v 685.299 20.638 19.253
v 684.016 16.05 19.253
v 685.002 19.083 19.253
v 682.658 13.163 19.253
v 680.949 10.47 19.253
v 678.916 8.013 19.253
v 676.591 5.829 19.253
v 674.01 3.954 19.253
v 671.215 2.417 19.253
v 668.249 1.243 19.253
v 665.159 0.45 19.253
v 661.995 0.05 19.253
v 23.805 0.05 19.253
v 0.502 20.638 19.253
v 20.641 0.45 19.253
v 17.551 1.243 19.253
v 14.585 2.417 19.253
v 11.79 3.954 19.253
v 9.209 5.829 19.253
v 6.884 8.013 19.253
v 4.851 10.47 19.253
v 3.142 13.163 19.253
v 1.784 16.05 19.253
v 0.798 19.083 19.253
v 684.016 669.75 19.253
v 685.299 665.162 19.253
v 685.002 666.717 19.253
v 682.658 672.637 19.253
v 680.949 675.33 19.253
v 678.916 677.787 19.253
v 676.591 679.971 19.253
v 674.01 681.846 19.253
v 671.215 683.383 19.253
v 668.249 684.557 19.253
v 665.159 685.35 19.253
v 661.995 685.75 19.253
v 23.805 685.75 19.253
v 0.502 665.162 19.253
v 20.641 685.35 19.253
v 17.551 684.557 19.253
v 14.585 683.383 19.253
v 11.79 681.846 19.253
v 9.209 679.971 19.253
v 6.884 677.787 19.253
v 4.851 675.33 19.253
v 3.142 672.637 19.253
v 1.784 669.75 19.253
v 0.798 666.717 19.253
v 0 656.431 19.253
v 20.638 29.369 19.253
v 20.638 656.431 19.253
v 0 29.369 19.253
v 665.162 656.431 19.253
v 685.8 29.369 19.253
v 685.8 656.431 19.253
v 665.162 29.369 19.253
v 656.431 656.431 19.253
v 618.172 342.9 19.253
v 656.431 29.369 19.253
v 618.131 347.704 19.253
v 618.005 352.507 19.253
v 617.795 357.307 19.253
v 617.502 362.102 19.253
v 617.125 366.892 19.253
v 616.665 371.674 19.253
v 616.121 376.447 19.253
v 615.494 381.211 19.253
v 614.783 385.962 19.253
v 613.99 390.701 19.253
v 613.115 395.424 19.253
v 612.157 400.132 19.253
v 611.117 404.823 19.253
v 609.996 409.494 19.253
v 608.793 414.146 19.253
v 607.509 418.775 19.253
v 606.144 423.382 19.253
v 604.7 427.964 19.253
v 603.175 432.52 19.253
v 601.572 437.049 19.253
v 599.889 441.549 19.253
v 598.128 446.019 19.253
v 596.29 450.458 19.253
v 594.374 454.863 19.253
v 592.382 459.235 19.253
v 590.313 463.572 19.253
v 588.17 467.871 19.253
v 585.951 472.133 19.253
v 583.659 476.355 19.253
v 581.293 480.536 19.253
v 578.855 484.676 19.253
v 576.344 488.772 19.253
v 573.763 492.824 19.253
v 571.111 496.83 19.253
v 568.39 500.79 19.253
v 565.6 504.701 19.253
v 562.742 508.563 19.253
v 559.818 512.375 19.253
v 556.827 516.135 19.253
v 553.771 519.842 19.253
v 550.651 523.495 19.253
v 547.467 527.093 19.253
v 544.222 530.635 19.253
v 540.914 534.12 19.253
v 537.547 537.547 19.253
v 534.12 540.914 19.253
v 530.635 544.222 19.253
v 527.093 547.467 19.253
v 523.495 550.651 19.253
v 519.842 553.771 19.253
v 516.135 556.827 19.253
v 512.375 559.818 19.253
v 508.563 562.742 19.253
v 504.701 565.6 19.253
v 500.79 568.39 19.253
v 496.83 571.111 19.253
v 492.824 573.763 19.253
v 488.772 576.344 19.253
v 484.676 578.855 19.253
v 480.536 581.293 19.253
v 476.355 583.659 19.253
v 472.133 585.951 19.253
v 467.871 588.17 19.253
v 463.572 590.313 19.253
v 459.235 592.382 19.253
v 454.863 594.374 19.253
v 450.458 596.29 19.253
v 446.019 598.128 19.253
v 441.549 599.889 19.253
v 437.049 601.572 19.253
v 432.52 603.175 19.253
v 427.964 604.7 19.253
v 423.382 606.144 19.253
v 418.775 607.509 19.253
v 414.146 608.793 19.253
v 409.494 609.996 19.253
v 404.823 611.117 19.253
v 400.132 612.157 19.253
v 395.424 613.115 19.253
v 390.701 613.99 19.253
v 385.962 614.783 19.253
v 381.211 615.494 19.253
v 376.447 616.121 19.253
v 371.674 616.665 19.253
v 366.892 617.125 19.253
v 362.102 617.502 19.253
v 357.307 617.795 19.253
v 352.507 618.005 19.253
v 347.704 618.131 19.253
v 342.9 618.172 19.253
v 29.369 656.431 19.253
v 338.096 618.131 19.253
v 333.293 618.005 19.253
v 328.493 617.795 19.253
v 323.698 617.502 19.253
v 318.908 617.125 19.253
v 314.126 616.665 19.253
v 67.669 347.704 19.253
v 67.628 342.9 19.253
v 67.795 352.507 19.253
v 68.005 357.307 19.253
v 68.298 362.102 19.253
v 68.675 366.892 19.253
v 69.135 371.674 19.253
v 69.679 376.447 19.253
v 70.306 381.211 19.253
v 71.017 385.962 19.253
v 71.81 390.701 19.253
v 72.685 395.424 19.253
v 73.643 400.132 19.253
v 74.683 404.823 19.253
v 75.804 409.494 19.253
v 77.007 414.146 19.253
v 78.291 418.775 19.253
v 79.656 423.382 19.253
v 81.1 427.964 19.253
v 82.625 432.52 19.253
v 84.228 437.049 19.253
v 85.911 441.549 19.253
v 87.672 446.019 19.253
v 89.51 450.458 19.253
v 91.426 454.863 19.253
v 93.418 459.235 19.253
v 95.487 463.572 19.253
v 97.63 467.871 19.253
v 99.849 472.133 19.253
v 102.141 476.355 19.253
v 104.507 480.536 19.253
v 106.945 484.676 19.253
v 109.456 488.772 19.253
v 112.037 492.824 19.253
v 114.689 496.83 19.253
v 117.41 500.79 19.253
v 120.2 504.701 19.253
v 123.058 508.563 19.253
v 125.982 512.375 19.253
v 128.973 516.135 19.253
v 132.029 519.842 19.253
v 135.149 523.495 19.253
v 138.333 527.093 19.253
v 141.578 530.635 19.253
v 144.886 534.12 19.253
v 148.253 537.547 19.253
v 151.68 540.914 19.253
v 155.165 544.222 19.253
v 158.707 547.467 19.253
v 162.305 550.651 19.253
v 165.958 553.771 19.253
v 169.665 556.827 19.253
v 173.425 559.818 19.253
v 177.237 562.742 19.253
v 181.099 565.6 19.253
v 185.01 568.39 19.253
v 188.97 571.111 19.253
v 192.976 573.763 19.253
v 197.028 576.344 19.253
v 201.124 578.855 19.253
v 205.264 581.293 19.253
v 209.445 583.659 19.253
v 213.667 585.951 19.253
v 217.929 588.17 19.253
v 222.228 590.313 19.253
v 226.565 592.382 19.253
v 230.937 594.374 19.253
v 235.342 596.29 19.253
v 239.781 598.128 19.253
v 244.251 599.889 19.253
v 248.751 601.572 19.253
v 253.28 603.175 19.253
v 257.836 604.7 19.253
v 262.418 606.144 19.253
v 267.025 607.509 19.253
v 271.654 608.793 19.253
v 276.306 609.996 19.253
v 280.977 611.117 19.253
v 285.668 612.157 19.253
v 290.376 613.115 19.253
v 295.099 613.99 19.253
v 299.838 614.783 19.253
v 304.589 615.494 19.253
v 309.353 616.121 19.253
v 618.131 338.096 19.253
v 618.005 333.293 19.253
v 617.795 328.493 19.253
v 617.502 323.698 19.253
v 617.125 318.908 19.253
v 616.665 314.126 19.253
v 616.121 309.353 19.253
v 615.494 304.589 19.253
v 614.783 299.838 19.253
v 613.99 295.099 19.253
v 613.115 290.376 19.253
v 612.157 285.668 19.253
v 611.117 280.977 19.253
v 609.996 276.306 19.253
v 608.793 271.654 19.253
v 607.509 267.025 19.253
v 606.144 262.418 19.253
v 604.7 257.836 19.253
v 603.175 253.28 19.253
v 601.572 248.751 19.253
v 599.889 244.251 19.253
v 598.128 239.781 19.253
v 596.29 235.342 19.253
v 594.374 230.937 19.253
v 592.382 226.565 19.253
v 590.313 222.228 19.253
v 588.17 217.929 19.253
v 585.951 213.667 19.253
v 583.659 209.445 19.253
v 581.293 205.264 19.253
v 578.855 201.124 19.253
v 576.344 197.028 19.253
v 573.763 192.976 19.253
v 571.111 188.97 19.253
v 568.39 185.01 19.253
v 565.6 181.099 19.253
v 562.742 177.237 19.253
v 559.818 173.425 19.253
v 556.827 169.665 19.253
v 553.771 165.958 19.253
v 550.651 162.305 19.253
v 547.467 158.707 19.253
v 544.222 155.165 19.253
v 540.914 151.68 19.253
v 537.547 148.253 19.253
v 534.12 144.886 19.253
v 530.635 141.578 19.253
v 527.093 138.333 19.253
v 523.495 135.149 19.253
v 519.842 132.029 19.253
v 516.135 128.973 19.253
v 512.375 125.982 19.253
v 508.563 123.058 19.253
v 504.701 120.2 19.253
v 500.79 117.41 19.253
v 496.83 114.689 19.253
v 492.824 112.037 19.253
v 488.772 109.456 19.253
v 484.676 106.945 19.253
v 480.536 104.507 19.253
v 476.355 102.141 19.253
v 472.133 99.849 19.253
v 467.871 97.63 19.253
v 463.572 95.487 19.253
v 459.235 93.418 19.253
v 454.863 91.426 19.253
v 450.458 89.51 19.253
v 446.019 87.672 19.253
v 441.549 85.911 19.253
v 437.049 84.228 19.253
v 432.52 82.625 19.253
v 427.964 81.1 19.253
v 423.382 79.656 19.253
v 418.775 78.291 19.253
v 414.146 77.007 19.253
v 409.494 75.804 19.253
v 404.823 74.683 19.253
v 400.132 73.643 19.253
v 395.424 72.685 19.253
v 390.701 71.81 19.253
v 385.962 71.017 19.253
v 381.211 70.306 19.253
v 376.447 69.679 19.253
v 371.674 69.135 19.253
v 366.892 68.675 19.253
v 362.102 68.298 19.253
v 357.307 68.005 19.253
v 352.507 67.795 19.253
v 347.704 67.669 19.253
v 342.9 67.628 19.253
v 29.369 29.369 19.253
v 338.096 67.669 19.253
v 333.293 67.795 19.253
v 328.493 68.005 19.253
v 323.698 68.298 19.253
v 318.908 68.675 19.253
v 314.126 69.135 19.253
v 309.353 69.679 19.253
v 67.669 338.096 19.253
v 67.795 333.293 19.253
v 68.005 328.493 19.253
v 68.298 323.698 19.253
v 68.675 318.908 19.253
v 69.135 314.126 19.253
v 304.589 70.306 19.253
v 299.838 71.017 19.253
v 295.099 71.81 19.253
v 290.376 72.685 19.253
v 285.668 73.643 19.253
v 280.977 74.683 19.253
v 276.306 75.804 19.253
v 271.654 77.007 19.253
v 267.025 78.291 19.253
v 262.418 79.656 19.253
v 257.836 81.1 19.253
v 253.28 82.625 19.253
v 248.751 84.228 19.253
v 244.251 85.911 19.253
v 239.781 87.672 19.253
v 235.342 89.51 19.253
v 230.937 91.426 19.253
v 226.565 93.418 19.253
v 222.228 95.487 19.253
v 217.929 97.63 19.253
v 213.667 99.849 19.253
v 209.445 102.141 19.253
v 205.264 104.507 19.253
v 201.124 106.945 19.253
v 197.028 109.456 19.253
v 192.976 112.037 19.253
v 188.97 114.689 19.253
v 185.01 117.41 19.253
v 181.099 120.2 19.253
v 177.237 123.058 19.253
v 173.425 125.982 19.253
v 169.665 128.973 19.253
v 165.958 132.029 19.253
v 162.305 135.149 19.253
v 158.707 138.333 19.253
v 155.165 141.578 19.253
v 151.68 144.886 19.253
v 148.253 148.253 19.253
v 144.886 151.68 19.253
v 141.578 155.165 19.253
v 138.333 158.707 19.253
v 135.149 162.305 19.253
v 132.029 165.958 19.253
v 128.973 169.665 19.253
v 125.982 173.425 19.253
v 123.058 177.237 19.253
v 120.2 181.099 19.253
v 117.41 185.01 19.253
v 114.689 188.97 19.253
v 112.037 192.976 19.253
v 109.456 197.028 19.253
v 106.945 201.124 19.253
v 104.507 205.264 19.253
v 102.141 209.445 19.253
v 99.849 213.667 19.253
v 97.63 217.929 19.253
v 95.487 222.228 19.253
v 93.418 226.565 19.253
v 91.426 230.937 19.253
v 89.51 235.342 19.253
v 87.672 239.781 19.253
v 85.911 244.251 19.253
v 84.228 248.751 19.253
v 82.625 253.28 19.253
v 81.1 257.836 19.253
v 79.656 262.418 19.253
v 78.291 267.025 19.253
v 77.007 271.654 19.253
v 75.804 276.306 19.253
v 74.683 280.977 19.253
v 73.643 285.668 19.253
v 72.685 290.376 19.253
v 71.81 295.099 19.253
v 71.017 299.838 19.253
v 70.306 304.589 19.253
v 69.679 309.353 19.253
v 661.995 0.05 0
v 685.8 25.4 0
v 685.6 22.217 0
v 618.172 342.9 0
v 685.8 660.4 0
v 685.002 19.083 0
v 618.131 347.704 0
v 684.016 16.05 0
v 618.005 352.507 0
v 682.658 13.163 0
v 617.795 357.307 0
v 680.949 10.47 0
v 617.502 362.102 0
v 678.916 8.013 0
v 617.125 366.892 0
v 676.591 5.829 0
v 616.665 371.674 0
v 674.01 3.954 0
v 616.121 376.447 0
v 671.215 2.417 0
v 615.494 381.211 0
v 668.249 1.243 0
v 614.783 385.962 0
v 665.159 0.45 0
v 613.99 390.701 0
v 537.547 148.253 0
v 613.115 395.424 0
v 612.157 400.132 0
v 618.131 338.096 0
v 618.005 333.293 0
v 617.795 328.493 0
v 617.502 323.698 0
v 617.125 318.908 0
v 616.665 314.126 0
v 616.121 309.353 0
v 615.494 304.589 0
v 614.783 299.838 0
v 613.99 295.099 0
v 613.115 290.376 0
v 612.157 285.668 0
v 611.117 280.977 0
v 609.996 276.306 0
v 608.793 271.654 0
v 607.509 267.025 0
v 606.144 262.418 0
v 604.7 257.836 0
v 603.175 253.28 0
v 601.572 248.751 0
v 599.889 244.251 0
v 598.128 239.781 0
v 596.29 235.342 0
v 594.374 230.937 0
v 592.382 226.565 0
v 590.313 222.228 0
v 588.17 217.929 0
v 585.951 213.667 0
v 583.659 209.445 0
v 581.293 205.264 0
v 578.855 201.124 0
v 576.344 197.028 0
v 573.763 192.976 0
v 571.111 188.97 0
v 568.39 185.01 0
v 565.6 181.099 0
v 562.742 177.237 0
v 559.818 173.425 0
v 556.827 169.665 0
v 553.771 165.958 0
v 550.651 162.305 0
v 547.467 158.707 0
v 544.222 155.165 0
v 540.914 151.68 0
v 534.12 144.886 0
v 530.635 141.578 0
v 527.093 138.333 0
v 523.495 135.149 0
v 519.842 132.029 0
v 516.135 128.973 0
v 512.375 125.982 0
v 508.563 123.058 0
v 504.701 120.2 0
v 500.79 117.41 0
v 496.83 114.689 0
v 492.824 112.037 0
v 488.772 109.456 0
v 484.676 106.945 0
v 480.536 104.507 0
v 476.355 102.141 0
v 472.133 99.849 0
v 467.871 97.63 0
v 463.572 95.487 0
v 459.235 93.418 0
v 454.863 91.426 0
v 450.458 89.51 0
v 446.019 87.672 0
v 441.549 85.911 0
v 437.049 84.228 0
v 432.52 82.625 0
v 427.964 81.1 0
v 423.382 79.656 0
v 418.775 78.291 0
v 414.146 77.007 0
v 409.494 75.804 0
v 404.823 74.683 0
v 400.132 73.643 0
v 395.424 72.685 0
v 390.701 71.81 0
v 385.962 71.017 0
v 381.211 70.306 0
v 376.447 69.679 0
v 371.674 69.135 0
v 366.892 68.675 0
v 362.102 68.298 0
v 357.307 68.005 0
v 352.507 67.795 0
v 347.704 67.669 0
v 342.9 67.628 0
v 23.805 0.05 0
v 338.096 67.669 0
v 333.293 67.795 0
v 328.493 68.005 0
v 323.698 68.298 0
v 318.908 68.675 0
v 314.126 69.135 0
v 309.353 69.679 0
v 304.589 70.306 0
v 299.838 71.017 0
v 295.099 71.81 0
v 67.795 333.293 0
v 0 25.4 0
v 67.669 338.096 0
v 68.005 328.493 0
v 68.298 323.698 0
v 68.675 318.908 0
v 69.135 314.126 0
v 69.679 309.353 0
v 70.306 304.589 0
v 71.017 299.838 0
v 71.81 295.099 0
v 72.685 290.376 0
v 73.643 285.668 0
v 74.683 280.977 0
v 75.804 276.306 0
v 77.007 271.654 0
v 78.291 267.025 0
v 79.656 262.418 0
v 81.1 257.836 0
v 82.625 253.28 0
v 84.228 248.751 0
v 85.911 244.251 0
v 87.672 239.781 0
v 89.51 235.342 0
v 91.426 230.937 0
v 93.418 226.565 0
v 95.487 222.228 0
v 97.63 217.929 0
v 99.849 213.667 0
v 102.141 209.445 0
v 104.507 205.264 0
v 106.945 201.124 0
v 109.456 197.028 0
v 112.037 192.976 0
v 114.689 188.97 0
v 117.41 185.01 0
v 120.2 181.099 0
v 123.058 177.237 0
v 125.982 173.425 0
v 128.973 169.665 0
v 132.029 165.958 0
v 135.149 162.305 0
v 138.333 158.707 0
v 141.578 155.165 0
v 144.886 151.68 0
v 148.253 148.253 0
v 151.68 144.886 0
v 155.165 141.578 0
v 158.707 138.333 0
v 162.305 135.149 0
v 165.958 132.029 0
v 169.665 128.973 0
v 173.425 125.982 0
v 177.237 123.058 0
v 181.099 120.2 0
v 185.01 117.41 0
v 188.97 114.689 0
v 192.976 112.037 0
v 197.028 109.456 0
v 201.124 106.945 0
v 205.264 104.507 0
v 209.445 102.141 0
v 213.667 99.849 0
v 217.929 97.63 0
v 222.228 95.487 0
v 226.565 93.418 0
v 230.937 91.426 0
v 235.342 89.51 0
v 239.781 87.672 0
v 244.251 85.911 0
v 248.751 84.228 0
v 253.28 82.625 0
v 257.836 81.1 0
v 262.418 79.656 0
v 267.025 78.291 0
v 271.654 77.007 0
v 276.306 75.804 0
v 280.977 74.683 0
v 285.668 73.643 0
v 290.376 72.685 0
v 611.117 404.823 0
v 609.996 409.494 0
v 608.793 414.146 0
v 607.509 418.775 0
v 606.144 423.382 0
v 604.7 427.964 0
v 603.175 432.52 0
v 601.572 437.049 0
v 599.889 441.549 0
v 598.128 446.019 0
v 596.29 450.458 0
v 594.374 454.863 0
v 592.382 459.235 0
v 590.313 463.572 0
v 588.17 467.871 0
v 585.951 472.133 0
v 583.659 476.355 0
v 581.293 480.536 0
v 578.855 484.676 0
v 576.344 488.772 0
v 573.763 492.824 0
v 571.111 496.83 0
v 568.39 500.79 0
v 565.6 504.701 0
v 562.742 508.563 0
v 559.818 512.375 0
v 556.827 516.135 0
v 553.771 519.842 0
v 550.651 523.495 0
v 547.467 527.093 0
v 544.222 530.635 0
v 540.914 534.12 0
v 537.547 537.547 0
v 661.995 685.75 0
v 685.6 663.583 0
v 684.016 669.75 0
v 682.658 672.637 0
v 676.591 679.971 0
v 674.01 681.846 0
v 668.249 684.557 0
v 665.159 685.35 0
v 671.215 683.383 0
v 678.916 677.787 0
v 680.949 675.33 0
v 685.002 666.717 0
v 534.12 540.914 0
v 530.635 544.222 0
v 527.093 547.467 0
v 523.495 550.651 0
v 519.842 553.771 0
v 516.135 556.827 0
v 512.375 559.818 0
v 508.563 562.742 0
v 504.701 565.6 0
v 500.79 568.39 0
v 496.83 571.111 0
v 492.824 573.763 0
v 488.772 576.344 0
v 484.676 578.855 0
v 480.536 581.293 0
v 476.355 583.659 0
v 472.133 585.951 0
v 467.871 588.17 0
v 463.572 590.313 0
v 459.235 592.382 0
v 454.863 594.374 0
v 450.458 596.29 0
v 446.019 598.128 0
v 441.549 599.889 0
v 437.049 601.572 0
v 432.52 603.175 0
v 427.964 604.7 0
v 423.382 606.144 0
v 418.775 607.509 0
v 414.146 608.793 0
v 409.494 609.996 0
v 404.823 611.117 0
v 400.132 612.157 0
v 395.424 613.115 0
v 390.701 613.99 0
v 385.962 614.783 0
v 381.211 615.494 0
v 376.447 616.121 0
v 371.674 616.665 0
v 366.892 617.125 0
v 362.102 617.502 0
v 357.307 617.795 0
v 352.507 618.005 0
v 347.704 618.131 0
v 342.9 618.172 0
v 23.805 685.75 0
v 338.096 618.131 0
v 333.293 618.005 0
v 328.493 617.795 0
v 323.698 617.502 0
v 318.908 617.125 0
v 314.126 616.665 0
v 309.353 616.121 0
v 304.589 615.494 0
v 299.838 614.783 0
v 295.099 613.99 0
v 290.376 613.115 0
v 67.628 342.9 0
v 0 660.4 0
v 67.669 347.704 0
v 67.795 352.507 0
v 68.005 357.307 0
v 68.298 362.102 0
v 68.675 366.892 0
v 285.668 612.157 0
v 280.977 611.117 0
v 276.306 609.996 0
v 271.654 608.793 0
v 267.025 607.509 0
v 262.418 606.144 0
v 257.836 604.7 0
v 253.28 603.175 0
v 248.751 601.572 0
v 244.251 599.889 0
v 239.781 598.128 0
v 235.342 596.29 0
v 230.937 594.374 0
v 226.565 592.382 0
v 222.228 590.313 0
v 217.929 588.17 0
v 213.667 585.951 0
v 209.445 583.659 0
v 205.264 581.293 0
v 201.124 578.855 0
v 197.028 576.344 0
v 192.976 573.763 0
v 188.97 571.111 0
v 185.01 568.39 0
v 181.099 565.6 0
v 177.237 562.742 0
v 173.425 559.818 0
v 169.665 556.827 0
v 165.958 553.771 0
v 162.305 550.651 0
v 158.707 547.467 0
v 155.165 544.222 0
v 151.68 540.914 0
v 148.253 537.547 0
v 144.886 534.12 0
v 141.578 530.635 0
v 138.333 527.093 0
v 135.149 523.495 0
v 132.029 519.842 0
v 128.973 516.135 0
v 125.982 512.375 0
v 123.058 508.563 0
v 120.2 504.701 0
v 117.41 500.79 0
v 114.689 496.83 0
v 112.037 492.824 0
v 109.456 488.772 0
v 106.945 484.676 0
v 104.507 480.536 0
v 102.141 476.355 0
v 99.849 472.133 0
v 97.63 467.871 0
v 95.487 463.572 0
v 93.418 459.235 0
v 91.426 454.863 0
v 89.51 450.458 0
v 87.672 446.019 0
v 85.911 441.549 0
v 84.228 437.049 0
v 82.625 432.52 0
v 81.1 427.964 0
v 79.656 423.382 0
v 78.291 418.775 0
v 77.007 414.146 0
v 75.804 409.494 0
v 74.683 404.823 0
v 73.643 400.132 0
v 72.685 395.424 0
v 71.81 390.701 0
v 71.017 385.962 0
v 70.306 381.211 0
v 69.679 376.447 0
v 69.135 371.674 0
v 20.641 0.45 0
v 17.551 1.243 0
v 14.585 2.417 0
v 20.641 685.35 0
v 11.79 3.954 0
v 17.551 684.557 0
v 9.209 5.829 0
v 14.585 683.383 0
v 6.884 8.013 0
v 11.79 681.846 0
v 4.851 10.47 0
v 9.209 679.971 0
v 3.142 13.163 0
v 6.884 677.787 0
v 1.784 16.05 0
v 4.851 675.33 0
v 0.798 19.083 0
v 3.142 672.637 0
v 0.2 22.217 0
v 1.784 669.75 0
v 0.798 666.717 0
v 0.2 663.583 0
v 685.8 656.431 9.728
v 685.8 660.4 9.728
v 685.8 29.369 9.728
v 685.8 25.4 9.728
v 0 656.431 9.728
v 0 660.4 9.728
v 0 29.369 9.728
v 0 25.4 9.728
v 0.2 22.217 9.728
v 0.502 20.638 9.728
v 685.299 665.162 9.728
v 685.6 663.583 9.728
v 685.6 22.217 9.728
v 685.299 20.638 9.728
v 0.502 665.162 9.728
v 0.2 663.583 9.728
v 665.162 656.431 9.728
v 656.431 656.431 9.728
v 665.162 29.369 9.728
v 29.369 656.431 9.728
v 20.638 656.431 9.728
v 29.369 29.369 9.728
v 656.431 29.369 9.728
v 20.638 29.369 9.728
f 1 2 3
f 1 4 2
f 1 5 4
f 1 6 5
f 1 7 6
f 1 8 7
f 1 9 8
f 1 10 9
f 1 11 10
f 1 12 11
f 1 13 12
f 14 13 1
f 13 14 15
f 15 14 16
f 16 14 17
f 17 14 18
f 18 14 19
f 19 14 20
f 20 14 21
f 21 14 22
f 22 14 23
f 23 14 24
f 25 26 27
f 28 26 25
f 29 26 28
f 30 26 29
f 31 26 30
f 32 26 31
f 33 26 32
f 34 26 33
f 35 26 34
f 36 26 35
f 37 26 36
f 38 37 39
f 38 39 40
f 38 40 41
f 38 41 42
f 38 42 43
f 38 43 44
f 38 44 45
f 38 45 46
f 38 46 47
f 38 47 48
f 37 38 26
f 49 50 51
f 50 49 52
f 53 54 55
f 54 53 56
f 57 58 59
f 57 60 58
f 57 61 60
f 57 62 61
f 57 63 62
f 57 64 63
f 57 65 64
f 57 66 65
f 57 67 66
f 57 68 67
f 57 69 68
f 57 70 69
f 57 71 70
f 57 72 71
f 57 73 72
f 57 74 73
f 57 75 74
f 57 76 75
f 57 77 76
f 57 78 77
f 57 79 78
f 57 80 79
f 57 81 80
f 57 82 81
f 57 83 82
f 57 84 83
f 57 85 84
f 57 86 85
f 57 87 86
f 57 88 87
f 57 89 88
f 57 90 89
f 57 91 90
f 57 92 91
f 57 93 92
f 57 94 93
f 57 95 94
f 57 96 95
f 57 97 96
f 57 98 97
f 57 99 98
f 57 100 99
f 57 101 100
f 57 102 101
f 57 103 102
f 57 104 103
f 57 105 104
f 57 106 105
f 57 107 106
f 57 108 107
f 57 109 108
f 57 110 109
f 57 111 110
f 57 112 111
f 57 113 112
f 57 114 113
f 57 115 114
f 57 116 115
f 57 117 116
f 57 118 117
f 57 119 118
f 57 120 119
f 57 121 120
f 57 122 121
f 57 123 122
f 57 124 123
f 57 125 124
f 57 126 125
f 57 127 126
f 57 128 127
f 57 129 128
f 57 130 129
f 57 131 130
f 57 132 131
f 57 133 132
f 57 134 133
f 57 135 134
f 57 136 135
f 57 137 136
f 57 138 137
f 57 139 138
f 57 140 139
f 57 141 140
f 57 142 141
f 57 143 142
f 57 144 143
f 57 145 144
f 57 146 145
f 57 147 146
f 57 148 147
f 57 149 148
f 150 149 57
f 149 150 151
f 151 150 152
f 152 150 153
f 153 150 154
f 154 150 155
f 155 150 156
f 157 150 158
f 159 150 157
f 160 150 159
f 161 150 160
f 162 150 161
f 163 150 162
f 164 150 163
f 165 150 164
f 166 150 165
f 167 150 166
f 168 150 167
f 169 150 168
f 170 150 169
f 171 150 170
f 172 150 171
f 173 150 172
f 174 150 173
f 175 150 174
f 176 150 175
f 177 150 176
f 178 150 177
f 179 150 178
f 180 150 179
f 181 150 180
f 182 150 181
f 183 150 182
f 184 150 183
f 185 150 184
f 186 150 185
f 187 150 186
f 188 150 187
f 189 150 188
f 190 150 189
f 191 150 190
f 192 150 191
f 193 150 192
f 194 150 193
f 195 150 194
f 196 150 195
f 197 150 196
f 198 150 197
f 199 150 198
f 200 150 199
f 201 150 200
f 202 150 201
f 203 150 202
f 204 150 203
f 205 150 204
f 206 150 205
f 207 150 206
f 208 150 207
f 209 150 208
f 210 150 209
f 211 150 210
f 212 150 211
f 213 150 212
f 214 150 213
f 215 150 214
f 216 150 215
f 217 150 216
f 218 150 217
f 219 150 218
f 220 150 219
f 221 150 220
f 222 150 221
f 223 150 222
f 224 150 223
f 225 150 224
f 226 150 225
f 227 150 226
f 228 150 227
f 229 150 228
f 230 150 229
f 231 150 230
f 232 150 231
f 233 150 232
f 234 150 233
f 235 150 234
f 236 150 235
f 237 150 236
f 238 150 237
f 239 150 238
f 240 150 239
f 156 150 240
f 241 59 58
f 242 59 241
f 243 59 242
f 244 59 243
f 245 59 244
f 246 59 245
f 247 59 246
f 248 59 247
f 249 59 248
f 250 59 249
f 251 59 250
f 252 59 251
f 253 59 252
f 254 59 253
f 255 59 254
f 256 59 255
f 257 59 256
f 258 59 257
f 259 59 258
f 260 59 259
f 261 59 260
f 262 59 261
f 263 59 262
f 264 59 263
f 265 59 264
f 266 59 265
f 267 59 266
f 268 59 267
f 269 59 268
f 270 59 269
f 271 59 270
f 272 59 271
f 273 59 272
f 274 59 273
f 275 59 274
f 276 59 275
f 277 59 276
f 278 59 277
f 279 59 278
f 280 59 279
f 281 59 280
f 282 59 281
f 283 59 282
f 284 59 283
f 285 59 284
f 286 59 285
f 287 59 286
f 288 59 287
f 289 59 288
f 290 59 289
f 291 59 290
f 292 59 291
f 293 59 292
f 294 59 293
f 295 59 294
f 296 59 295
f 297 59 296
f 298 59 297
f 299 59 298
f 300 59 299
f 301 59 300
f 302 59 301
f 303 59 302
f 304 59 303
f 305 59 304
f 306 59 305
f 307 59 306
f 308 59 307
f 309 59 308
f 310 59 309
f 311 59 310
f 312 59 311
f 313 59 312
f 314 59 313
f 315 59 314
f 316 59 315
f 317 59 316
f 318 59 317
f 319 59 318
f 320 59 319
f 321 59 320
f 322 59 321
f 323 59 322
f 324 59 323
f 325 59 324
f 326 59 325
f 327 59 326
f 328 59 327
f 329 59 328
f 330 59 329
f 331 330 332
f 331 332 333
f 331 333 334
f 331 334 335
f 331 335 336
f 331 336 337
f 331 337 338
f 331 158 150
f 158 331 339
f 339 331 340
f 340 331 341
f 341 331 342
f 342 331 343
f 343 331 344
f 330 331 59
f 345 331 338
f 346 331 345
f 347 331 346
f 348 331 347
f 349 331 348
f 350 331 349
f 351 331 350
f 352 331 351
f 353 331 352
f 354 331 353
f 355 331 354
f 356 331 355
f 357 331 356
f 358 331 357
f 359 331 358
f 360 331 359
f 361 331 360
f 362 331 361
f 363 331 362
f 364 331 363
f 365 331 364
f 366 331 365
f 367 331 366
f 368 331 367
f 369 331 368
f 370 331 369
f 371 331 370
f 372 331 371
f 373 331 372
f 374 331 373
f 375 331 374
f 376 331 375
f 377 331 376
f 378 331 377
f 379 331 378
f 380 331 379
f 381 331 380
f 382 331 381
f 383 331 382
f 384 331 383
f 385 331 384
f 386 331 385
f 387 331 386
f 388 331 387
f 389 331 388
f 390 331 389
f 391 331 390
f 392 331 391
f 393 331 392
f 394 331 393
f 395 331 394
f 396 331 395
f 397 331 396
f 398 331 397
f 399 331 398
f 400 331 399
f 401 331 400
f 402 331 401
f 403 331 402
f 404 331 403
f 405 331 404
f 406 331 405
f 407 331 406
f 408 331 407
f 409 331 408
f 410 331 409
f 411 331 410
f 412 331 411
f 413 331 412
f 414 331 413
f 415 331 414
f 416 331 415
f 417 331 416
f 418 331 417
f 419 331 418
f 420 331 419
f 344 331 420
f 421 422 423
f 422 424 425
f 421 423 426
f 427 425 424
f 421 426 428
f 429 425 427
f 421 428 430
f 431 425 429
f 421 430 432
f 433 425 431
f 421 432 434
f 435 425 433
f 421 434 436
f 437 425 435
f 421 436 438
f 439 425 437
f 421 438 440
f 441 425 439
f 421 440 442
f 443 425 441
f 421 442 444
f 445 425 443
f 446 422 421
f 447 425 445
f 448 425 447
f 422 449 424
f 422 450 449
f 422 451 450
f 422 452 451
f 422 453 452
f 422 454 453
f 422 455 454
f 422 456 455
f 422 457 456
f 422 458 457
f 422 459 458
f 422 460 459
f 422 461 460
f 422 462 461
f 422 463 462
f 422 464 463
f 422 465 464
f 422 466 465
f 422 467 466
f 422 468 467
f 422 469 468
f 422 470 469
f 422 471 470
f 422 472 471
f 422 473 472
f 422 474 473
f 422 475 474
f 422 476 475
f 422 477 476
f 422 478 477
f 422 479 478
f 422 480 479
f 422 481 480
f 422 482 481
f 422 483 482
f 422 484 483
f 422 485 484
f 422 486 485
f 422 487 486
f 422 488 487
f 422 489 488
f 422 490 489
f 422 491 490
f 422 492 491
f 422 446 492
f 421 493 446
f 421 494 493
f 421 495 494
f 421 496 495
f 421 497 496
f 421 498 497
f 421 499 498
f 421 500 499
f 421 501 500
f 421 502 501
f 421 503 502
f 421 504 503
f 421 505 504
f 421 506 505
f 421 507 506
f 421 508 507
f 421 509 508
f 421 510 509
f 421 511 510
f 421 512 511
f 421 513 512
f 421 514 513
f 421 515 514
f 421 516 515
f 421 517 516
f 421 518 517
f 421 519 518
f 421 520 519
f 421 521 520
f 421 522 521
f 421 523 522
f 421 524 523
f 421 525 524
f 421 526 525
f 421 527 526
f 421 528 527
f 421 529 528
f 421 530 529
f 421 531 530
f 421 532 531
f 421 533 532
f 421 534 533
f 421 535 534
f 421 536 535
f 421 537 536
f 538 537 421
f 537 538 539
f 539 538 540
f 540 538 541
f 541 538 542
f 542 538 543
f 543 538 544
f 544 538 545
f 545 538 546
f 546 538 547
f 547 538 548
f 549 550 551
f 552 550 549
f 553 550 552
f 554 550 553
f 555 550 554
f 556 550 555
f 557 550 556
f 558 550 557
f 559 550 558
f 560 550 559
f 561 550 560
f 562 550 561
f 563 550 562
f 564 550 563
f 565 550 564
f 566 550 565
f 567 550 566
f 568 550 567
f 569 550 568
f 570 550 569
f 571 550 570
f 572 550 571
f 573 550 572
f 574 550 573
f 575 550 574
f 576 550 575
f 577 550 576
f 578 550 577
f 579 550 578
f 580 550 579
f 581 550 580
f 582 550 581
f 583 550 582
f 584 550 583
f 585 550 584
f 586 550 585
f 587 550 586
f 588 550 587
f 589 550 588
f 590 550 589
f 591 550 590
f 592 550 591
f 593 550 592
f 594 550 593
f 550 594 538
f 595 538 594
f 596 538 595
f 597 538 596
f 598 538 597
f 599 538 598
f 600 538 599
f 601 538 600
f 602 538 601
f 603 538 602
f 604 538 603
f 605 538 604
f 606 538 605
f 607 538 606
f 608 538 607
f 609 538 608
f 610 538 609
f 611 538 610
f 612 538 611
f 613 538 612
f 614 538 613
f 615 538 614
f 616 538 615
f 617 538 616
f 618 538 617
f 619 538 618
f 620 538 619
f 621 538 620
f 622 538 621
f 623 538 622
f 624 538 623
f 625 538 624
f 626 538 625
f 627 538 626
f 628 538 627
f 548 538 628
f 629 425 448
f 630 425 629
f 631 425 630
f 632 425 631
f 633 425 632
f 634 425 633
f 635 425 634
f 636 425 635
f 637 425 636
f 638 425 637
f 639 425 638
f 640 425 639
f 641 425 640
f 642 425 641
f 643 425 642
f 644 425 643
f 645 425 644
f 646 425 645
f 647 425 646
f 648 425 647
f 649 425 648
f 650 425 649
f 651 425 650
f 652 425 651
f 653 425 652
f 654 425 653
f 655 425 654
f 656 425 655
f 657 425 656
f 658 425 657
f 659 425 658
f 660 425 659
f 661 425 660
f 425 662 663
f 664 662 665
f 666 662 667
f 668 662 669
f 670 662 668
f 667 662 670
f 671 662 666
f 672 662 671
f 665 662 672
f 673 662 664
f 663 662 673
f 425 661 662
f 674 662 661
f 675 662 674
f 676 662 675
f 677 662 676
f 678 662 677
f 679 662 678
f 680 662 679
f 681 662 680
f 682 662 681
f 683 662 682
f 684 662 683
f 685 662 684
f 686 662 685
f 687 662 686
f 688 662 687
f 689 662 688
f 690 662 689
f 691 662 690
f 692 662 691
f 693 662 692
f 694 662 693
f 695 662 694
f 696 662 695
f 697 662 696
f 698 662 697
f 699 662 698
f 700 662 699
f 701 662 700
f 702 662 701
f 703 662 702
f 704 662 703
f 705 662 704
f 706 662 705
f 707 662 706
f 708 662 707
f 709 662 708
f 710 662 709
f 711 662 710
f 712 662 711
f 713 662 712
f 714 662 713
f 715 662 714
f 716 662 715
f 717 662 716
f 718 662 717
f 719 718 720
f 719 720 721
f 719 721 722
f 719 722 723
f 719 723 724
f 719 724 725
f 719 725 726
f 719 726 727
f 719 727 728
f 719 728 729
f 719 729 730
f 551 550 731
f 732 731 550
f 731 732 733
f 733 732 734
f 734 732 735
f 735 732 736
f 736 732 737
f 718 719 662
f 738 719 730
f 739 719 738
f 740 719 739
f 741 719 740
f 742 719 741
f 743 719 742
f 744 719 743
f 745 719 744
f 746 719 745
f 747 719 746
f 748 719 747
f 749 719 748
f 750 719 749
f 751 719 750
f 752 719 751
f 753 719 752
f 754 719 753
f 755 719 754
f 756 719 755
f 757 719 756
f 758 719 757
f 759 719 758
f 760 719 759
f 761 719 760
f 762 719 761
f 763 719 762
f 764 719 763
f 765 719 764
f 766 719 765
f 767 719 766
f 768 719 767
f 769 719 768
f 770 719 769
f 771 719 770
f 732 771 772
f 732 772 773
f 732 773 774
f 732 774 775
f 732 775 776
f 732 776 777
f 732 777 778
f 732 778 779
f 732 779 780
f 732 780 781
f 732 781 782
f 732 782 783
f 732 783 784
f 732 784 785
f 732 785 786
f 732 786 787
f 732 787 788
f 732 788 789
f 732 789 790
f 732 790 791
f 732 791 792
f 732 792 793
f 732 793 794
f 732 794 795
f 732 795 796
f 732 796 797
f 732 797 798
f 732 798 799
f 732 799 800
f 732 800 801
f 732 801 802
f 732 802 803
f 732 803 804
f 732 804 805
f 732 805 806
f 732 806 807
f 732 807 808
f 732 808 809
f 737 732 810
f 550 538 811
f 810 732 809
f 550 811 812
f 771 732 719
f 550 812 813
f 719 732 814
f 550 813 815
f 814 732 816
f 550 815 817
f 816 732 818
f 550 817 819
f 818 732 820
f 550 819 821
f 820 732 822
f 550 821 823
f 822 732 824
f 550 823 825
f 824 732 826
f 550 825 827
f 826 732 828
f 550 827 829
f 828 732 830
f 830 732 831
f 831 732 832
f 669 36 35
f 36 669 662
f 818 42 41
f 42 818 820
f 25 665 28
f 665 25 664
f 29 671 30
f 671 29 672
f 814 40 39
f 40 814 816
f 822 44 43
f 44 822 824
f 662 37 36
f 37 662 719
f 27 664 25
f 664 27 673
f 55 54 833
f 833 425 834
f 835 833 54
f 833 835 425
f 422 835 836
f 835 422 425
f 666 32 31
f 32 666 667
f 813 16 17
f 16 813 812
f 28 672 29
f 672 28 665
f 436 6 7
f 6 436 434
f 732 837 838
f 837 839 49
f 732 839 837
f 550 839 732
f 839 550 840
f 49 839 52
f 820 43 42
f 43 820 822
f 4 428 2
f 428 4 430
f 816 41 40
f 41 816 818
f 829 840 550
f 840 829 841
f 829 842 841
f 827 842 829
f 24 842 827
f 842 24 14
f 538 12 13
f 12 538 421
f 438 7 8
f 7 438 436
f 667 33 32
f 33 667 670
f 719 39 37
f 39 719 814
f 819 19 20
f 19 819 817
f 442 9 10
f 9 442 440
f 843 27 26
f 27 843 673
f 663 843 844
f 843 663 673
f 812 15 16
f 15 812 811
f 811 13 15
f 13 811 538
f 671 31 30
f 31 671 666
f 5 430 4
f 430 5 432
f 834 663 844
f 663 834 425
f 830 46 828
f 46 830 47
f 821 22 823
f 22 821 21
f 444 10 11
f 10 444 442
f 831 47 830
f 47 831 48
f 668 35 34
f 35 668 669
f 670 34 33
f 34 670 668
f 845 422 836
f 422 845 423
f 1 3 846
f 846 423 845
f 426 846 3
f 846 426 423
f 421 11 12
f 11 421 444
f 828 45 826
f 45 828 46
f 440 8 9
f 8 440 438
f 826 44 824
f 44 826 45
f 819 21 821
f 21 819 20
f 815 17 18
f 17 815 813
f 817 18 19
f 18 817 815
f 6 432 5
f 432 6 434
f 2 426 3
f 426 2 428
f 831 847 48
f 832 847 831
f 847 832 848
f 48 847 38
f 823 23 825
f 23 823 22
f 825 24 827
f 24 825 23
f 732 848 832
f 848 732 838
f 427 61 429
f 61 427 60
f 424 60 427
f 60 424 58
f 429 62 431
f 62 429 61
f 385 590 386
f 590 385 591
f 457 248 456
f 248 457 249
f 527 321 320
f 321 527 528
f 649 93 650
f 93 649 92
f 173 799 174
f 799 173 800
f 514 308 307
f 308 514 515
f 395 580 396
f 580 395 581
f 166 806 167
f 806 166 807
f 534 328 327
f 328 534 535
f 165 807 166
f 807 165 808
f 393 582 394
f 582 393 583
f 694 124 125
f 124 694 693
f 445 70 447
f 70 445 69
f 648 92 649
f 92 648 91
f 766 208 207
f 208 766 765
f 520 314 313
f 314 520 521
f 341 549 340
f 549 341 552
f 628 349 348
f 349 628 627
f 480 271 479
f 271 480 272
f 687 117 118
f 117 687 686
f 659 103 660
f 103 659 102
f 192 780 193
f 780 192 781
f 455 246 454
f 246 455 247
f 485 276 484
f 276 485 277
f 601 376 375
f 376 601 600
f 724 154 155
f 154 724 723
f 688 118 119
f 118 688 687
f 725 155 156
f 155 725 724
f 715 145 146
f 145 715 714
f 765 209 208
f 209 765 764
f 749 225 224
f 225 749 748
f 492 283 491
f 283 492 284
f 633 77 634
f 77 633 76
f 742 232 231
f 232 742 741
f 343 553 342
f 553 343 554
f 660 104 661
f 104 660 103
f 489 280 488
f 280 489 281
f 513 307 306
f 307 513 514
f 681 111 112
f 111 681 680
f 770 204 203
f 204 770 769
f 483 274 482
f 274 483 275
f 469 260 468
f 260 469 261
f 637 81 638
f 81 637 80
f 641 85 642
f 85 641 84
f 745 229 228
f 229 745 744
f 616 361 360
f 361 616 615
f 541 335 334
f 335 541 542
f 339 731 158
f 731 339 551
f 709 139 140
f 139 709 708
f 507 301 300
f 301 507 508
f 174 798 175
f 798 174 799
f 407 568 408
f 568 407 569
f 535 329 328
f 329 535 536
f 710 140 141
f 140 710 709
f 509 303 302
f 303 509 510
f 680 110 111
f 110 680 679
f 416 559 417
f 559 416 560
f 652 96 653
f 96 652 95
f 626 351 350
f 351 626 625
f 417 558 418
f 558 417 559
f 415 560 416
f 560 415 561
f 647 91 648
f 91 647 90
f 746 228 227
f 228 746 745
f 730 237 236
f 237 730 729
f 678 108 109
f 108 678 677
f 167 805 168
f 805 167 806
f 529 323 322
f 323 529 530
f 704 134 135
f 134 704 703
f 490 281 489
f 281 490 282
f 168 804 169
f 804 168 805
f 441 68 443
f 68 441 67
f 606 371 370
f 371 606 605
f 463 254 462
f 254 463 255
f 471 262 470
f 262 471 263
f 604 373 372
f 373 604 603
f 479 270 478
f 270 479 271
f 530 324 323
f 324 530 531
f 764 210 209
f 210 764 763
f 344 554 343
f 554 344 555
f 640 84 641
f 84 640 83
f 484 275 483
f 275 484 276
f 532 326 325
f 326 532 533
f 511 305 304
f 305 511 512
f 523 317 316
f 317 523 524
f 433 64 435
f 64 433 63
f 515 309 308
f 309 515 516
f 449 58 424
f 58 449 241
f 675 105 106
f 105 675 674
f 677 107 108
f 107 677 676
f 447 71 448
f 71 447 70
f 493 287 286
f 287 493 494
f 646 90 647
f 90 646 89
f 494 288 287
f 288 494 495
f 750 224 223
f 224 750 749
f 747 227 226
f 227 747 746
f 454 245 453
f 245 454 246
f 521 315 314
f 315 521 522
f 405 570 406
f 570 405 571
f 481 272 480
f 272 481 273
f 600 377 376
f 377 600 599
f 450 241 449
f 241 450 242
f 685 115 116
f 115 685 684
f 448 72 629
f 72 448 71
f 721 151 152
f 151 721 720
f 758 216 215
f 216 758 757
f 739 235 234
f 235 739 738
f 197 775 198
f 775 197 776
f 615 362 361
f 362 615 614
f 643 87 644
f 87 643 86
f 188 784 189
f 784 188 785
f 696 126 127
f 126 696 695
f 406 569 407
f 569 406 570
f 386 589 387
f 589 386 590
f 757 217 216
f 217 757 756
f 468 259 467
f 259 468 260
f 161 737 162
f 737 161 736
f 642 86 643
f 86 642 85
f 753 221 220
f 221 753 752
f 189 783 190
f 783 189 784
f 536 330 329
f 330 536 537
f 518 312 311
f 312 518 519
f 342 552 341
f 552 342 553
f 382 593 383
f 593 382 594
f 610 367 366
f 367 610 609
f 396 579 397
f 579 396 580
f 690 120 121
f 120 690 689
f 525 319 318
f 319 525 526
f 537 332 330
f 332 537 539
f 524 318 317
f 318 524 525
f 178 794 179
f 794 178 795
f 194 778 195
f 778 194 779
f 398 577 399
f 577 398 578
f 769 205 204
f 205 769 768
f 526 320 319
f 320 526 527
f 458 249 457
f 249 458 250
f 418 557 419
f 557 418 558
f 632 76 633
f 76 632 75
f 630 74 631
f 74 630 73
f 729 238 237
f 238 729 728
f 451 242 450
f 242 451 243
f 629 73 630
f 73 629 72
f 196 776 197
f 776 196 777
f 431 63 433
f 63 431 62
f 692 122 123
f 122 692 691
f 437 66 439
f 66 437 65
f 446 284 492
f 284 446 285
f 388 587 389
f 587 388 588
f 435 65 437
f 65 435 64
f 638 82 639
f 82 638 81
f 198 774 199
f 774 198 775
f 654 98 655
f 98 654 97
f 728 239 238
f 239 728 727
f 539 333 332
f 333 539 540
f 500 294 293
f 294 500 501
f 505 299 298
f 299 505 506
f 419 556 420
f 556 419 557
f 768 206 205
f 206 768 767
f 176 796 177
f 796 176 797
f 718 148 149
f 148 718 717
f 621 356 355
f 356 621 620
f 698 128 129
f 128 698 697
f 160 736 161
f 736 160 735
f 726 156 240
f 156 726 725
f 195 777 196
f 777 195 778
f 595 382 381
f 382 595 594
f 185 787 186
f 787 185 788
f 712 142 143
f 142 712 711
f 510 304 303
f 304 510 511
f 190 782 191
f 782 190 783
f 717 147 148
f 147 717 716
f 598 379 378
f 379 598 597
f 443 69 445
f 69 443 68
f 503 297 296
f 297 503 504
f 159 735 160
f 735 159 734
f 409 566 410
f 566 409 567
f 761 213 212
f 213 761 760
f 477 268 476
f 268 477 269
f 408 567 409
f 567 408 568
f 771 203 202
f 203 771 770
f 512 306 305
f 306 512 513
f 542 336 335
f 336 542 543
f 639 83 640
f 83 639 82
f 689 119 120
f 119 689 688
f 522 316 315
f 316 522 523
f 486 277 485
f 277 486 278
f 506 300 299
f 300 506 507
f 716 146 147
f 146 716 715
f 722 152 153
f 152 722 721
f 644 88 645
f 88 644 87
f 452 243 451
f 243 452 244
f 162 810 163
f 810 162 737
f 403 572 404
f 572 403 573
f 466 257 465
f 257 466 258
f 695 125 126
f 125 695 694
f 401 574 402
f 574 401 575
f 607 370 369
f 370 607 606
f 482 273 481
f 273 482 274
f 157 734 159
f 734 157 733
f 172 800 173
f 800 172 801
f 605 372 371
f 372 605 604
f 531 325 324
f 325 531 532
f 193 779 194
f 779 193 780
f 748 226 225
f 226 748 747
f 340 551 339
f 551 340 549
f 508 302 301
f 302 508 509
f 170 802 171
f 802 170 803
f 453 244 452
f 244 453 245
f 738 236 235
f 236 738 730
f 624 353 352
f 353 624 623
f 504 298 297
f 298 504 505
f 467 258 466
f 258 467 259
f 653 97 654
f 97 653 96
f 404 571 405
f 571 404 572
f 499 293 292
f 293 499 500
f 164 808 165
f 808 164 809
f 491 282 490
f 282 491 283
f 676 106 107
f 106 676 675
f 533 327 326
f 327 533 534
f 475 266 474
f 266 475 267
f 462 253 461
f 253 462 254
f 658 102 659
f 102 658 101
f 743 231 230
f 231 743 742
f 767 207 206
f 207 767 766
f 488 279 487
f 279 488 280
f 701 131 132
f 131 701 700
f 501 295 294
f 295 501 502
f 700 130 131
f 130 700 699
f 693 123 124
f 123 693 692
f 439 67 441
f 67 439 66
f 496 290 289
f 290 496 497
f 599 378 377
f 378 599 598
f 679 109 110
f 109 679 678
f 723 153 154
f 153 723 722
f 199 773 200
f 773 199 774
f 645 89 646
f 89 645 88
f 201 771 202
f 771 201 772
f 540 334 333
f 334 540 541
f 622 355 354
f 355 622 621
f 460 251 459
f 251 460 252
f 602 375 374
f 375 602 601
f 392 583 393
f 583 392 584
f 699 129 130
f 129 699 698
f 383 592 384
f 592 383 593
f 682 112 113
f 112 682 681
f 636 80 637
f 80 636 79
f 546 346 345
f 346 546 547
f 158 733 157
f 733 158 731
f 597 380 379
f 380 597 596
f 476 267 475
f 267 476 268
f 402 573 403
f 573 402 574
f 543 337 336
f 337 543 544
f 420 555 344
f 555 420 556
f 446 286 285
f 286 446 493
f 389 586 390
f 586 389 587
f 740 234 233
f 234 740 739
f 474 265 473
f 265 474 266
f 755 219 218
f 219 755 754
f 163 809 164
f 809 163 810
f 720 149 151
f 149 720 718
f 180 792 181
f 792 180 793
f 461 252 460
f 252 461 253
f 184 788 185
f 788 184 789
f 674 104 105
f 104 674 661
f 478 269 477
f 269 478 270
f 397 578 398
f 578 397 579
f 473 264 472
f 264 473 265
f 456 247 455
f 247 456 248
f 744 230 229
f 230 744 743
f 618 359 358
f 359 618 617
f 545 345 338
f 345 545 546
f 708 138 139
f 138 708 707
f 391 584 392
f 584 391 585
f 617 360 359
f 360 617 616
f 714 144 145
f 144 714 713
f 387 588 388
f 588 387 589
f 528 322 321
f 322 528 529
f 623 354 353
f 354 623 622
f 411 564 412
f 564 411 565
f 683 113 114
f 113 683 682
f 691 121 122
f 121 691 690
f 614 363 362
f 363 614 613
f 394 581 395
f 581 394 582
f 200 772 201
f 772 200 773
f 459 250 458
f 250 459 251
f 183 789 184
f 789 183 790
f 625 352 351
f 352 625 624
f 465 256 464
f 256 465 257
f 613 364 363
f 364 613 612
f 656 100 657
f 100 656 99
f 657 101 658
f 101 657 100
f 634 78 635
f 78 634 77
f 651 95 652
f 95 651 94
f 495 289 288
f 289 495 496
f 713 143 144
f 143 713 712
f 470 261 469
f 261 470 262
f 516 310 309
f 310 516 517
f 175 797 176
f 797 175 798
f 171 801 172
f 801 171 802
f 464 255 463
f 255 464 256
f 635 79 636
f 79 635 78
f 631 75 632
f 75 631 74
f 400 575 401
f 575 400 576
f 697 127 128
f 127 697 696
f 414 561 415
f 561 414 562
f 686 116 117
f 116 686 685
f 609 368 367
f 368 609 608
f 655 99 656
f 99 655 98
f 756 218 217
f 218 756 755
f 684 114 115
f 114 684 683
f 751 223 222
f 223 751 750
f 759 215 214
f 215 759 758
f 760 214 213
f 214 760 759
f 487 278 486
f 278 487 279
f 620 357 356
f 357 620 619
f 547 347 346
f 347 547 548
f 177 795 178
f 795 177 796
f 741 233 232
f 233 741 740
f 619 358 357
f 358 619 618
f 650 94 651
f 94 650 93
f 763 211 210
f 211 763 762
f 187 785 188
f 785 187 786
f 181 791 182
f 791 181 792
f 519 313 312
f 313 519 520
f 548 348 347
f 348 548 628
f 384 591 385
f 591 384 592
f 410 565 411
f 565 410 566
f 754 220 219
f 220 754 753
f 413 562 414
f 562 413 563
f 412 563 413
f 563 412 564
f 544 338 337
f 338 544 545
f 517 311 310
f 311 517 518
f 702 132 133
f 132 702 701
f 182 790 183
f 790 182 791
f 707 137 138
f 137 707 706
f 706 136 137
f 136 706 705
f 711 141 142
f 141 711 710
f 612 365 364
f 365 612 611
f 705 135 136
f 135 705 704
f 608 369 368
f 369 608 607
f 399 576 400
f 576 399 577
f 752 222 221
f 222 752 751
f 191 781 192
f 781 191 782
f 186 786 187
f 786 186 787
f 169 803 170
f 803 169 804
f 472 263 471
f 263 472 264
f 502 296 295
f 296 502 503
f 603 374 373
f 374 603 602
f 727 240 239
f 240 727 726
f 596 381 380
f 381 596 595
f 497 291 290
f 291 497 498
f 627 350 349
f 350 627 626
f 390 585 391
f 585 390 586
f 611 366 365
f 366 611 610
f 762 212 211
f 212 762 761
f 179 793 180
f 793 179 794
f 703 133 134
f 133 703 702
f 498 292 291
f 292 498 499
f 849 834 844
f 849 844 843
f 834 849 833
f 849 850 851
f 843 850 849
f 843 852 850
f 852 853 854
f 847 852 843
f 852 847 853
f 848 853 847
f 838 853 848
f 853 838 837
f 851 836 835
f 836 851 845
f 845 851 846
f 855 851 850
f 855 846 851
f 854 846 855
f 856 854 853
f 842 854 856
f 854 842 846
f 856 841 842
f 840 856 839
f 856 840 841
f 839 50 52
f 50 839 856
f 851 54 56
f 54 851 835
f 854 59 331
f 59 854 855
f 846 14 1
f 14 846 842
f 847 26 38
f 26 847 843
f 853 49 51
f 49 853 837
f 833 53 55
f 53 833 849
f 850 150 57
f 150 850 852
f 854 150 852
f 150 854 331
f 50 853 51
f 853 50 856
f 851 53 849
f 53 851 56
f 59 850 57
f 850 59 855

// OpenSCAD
// file: my_roundedcube.scad
module my_roundedcube(x, y, t, r) {
    $fn = 50;
    translate([r, r, 0]) {
        minkowski() {
            cube([x - (r * 2), y - (r * 2), t / 2]);
            cylinder(r=r, h=t/2);
        }
    }
}
// main file
use <my_roundedcube.scad>;
$fn = 360;

// workaround for FreeCAD always importing OpenSCAD as mm units, https://github.com/FreeCAD/FreeCAD/issues/15304
function inch(x) = x * 25.4;

thickness = inch(0.758);
slot_inset = inch(13.0 / 16.0); // 0.8125
slot_width = inch(11.0 / 32.0); // 0.34375
slot_depth = inch(0.375);
difference() {
    my_roundedcube(inch(27), inch(27), thickness, inch(1));
    translate([inch(27.0 / 2.0), inch(27.0 / 2.0), inch(-5)]) { cylinder(d=inch(21.675), h=inch(10)); }
    // bottom through slot
    translate([inch(-1), slot_inset, thickness - slot_depth]) {
        cube([inch(29), slot_width, slot_depth]);
    }
    // top through slot
    translate([inch(-1), inch(27) - (slot_inset + slot_width), thickness - slot_depth]) {
        cube([inch(29), slot_width, slot_depth]);
    }
    // left stopped slot
    translate([slot_inset, slot_inset + slot_width, thickness - slot_depth]) {
        cube([slot_width, inch(24 + (21.0 / 32.0) + 0.05), slot_depth]);
    }
    // right stopped slot
    translate([inch(27) - (slot_inset + slot_width), slot_inset + slot_width, thickness - slot_depth]) {
        cube([slot_width, inch(24 + (21.0 / 32.0) + 0.05), slot_depth]);
    }
}
